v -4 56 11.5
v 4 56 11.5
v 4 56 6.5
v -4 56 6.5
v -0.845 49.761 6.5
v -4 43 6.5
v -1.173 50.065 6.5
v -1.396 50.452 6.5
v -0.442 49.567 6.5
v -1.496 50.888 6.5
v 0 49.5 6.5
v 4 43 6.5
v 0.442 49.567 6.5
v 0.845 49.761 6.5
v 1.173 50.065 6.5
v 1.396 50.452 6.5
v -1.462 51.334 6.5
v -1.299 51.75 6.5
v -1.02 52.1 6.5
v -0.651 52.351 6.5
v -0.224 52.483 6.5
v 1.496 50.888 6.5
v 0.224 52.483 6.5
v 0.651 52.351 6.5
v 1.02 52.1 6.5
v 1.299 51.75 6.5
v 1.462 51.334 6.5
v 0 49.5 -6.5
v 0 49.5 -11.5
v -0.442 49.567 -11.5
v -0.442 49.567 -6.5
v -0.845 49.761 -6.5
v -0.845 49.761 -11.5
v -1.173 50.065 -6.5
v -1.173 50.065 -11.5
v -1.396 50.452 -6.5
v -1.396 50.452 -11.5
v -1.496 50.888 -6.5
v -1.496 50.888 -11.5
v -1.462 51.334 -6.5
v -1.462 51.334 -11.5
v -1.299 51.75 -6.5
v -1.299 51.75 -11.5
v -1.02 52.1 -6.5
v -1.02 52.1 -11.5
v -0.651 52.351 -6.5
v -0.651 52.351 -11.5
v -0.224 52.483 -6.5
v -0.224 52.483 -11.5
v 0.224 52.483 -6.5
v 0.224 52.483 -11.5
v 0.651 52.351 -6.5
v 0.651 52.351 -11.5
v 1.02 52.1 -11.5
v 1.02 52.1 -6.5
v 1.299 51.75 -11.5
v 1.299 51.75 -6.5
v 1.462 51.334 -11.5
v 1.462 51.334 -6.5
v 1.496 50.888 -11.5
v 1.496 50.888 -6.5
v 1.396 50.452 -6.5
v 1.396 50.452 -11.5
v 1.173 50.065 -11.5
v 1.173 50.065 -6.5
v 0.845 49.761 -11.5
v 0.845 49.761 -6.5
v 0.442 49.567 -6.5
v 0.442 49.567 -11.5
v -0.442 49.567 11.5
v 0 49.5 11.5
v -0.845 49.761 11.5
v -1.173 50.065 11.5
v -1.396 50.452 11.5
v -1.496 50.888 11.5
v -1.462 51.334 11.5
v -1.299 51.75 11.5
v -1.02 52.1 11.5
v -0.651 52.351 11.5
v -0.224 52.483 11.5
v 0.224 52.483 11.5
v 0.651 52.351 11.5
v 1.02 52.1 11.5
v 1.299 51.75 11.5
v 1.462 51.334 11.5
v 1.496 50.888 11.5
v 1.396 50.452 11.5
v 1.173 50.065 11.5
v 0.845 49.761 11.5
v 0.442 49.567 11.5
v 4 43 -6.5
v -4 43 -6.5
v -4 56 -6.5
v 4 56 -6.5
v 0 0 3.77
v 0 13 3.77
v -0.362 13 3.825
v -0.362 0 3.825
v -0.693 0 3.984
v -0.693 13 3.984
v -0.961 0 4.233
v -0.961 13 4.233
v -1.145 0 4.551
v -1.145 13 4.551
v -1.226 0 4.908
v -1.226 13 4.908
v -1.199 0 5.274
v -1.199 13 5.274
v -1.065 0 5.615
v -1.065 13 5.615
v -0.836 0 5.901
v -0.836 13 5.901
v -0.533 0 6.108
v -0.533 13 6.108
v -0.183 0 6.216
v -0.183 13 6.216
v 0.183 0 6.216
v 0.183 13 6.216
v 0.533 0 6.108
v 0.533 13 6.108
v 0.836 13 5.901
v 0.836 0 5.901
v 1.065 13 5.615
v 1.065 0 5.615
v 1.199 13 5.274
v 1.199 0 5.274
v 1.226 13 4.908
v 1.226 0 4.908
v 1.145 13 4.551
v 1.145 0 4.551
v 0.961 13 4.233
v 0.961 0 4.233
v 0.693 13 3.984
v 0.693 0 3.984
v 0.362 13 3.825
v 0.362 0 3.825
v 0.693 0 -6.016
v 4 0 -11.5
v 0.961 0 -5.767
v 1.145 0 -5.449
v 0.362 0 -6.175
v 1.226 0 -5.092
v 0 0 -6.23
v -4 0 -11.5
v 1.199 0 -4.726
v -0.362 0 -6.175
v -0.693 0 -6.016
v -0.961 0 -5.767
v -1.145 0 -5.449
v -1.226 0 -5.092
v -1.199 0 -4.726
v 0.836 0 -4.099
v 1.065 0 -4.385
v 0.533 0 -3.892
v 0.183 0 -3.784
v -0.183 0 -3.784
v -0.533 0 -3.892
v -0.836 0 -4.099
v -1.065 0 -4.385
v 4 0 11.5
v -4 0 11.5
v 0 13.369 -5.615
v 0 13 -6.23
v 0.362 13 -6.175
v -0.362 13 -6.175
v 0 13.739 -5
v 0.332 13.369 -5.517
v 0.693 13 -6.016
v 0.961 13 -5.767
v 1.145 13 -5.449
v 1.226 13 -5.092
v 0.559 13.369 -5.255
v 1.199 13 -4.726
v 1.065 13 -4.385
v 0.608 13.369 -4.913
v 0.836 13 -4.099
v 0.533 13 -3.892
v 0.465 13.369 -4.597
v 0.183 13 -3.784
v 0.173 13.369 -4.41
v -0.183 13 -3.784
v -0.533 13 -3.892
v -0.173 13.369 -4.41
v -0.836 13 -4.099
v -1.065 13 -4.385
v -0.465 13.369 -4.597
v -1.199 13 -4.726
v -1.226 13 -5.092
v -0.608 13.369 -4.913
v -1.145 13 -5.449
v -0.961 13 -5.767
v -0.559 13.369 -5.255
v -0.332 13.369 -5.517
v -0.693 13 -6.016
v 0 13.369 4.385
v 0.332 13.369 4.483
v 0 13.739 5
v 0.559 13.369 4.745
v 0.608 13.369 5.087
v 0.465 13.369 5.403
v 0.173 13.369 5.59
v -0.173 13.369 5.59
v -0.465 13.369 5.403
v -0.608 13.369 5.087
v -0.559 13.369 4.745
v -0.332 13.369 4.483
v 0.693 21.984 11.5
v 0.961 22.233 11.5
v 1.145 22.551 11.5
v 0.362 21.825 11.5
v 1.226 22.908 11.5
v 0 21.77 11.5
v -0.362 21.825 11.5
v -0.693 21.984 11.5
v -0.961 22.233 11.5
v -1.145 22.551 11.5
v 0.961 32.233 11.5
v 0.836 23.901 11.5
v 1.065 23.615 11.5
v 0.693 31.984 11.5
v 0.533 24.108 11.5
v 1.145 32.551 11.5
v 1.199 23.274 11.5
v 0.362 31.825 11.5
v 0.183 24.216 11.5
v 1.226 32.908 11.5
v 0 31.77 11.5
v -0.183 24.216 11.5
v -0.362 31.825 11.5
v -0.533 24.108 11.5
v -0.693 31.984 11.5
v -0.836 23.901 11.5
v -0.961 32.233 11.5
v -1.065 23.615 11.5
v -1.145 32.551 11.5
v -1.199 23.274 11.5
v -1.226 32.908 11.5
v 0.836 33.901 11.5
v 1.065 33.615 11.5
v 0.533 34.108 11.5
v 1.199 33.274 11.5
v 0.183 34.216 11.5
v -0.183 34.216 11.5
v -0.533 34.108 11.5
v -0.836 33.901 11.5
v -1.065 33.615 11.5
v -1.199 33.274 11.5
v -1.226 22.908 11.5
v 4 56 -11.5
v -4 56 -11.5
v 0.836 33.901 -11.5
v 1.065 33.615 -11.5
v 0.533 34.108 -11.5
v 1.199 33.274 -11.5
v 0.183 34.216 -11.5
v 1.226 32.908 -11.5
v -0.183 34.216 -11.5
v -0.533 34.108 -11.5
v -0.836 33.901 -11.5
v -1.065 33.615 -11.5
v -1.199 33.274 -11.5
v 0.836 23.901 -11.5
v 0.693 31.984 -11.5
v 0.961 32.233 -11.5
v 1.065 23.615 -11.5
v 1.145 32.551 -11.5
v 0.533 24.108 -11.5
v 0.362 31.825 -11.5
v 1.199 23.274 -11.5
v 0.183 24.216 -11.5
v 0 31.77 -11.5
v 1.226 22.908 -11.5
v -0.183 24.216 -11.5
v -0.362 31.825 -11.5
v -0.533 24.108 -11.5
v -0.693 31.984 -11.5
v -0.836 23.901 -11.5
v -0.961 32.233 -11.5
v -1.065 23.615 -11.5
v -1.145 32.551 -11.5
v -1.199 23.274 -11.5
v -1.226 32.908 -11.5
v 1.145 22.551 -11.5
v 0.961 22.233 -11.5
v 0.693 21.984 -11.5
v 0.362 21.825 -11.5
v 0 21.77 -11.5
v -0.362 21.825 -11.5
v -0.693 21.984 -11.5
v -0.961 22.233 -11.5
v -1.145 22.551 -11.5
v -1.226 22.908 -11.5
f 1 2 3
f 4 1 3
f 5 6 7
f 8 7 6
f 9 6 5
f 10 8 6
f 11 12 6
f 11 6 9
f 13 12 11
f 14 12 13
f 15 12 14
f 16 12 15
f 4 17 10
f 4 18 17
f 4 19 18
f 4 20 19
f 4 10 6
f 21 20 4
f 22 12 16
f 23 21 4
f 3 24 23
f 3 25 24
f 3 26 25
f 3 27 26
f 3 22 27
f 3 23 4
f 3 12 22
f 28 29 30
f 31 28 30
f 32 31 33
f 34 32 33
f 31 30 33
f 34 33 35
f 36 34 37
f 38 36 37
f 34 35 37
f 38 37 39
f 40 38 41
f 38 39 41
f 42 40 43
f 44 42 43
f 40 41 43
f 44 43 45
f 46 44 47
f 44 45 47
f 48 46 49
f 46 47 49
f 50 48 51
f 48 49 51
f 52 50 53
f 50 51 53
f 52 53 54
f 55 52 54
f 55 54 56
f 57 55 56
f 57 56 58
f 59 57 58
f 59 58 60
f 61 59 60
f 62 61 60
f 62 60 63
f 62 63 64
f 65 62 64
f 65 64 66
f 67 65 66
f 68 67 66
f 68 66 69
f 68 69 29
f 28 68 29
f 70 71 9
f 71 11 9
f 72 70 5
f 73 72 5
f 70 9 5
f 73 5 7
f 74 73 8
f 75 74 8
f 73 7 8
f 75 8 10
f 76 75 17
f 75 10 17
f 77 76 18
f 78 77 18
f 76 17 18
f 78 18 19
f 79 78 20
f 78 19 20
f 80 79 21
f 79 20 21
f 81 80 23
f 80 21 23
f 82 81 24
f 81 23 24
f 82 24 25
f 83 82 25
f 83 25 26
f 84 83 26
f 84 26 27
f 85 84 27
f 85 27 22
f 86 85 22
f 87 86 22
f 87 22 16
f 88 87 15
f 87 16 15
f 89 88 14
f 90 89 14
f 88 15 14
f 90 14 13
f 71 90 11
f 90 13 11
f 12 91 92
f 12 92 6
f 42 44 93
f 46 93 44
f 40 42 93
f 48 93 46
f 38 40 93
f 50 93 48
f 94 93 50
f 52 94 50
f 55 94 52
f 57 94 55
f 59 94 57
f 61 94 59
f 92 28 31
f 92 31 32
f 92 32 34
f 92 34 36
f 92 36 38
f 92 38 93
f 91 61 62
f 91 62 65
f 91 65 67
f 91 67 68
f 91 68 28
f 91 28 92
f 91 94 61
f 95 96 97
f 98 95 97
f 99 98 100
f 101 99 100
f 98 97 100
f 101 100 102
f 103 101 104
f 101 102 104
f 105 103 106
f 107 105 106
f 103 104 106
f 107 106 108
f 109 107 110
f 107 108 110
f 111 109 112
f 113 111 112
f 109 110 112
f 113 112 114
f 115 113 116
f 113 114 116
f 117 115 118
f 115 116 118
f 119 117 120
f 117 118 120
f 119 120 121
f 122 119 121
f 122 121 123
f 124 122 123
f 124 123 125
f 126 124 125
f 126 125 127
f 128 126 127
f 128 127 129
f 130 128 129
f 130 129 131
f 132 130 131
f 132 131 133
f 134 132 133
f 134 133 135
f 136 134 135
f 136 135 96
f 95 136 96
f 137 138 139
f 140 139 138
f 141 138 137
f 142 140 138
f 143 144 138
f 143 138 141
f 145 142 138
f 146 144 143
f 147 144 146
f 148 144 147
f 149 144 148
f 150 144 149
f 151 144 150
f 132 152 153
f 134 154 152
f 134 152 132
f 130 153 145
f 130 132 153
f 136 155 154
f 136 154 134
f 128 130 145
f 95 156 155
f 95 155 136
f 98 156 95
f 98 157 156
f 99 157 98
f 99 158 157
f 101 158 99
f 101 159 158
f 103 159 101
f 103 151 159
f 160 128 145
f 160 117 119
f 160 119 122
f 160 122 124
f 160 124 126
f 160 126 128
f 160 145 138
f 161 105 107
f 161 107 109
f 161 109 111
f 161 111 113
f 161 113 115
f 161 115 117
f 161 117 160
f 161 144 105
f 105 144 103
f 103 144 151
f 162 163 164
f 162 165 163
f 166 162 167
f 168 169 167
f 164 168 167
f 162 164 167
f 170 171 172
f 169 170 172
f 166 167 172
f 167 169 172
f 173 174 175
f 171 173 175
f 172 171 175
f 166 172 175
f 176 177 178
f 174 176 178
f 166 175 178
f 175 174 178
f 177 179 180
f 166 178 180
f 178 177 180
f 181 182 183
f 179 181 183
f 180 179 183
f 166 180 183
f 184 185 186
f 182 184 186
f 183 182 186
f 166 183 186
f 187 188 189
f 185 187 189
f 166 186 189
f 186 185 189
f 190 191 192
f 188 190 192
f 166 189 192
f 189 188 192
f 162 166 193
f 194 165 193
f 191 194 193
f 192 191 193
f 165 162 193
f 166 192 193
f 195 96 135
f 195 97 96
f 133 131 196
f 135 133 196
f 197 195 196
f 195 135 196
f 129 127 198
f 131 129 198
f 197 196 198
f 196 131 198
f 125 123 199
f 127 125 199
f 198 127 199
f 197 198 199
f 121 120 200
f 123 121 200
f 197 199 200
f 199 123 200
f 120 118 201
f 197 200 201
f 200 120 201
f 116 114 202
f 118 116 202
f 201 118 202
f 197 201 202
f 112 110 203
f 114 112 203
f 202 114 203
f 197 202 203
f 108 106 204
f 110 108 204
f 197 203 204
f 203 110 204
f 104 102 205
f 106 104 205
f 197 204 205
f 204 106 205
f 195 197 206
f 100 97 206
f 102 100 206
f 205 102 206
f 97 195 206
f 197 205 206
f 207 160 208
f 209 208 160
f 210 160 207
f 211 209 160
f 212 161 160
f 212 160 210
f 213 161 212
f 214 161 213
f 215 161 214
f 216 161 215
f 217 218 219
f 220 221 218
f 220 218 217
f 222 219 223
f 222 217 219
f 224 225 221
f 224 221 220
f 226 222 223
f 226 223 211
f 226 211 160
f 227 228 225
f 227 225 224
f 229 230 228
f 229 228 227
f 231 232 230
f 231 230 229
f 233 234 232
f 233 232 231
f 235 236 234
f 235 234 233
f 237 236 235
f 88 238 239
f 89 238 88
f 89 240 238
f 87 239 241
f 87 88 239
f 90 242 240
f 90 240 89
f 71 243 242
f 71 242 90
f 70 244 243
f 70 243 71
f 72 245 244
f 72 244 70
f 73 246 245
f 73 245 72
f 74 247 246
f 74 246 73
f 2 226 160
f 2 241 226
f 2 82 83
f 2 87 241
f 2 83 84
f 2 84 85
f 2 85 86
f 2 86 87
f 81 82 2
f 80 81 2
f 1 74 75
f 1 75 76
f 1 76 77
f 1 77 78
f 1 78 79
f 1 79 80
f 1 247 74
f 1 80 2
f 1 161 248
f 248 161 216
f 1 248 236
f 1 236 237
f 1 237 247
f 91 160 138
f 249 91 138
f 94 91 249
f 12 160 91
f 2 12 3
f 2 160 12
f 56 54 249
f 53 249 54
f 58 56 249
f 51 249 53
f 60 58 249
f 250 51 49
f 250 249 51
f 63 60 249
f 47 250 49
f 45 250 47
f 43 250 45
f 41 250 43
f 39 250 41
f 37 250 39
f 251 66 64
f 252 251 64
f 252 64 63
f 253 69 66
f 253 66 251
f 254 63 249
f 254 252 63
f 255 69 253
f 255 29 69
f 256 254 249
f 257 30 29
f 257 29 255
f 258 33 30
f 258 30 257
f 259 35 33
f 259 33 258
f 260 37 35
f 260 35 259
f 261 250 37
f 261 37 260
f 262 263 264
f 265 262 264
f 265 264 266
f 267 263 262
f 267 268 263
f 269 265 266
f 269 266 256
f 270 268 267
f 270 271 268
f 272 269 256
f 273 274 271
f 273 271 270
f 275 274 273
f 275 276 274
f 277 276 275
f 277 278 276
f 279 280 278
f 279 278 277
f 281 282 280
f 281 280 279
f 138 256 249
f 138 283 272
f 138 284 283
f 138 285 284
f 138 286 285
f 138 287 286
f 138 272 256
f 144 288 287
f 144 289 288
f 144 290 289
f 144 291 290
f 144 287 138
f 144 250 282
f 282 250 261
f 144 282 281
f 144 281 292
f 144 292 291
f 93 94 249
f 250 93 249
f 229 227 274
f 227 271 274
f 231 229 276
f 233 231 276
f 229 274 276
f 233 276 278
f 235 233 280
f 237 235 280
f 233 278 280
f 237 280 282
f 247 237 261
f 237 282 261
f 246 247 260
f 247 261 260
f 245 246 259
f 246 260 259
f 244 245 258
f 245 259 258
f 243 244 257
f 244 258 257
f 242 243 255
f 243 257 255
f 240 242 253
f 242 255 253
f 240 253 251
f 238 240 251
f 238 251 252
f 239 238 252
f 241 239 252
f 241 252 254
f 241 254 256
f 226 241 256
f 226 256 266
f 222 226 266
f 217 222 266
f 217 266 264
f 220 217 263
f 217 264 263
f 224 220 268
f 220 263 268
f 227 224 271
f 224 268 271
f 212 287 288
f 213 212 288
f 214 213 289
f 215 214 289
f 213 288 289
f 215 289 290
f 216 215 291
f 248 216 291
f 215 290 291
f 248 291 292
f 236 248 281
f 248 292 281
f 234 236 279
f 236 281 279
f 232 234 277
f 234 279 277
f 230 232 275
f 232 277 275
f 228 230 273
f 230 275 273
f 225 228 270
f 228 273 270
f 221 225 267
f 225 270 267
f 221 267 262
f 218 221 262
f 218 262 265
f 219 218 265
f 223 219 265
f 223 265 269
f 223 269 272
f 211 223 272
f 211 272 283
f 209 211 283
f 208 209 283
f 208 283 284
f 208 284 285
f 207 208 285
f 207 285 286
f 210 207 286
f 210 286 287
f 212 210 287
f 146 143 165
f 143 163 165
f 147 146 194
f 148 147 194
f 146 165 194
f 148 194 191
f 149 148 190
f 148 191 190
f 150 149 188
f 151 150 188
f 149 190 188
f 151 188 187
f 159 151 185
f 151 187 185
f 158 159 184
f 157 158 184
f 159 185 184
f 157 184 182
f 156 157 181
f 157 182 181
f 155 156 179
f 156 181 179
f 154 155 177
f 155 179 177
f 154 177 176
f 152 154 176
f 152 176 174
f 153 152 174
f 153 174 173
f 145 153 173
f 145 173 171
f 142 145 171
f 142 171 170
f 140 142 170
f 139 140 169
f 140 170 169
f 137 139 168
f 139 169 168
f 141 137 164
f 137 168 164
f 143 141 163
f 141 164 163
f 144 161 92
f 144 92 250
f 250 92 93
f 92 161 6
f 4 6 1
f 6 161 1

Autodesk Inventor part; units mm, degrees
ref_plane "YZ Plane" through (0, 0, 0) normal (1, 0, 0) x (0, 1, 0)
ref_plane "XZ Plane" through (0, 0, 0) normal (0, 1, 0) x (-1, 0, 0)
ref_plane "XY Plane" through (0, 0, 0) normal (0, 0, 1) x (1, 0, 0)
sketch "Sketch1" plane through (0, 0, 0) normal (1, 0, 0) x (0, 1, 0)
  line L0 (0, 11.5) -> (56, 11.5)
  line L1 (56, 11.5) -> (56, -11.5)
  line L2 (56, -11.5) -> (0, -11.5)
  line L3 (0, -11.5) -> (0, 11.5)
  point P0 (0, 0)
  dimension "d0" = 0
  dimension "d1" = 23
  dimension "d2" = 56
  dimension "d3" = 11.5
extrude "Extrusion1" add sketch "Sketch1" along normal mid plane 8
sketch "Sketch2" plane through (4, 0, 0) normal (1, 0, 0) x (0, 0, -1)
  line L0 (11.5, 56) -> (-11.5, 56) projected
  line L1 (-6.5, 56) -> (6.5, 56)
  line L2 (6.5, 56) -> (6.5, 43)
  line L3 (6.5, 43) -> (-6.5, 43)
  line L4 (-6.5, 43) -> (-6.5, 56)
  point P0 (0, 0)
  dimension "d6" = 13
  dimension "d7" = 13
  dimension "d8" = 6.5
extrude "Extrusion2" cut sketch "Sketch2" against normal through all
sketch "Sketch4" plane through (-4, 0, 11.5) normal (0, 0, 1) x (1, 0, 0)
  circle A0 centre (4, 51) radius 1.5
  line L0 (0, 56) -> (8, 56) projected
  line L1 (0, 0) -> (8, 0) projected
  point P0 (4, 0)
  point P1 (4, 0)
  dimension "d12" = 3
  dimension "d13" = 5
hole "Hole1" at (0, 51, 11.5) direction (0, 0, -1) diameter 3 end through all
sketch "Sketch5" plane through (-4, 0, -11.5) normal (0, -1, 0) x (1, 0, 0)
  circle A0 centre (4, 16.5) radius 1.5
  circle A1 centre (4, 6.5) radius 1.5
  point P0 (4, 11.5)
  dimension "d21" = 3
  dimension "d23" = 10
  dimension "d24" = 5
hole "Hole2" at (0, 0, 5) at (0, 0, -5) direction (0, 1, 0) diameter 2.459 depth 13 tip angle 118 thread size "M3x0.5" class "6H" standard "ISO Metric profile"
sketch "Sketch6" plane through (-4, 0, 11.5) normal (0, 0, 1) x (1, 0, 0)
  circle A0 centre (4, 33) radius 1.5
  circle A1 centre (4, 23) radius 1.5
  line L0 (0, 0) -> (8, 0) projected
  point P0 (4, 0)
  point P1 (4, 0)
  dimension "d32" = 3
  dimension "d33" = 10
  dimension "d34" = 23
hole "Hole3" at (0, 33, 11.5) at (0, 23, 11.5) direction (0, 0, -1) diameter 2.459 end through all thread size "M3x0.5" class "6H" standard "ISO Metric profile"
equation "\"d3\" = 0.5 * d1"
equation "\"d8\" = 0.5 * d6"
equation "\"d24\" = 0.5 * d23"
properties part number "Gripper_Outer_Support" material "Aluminum 6061"
